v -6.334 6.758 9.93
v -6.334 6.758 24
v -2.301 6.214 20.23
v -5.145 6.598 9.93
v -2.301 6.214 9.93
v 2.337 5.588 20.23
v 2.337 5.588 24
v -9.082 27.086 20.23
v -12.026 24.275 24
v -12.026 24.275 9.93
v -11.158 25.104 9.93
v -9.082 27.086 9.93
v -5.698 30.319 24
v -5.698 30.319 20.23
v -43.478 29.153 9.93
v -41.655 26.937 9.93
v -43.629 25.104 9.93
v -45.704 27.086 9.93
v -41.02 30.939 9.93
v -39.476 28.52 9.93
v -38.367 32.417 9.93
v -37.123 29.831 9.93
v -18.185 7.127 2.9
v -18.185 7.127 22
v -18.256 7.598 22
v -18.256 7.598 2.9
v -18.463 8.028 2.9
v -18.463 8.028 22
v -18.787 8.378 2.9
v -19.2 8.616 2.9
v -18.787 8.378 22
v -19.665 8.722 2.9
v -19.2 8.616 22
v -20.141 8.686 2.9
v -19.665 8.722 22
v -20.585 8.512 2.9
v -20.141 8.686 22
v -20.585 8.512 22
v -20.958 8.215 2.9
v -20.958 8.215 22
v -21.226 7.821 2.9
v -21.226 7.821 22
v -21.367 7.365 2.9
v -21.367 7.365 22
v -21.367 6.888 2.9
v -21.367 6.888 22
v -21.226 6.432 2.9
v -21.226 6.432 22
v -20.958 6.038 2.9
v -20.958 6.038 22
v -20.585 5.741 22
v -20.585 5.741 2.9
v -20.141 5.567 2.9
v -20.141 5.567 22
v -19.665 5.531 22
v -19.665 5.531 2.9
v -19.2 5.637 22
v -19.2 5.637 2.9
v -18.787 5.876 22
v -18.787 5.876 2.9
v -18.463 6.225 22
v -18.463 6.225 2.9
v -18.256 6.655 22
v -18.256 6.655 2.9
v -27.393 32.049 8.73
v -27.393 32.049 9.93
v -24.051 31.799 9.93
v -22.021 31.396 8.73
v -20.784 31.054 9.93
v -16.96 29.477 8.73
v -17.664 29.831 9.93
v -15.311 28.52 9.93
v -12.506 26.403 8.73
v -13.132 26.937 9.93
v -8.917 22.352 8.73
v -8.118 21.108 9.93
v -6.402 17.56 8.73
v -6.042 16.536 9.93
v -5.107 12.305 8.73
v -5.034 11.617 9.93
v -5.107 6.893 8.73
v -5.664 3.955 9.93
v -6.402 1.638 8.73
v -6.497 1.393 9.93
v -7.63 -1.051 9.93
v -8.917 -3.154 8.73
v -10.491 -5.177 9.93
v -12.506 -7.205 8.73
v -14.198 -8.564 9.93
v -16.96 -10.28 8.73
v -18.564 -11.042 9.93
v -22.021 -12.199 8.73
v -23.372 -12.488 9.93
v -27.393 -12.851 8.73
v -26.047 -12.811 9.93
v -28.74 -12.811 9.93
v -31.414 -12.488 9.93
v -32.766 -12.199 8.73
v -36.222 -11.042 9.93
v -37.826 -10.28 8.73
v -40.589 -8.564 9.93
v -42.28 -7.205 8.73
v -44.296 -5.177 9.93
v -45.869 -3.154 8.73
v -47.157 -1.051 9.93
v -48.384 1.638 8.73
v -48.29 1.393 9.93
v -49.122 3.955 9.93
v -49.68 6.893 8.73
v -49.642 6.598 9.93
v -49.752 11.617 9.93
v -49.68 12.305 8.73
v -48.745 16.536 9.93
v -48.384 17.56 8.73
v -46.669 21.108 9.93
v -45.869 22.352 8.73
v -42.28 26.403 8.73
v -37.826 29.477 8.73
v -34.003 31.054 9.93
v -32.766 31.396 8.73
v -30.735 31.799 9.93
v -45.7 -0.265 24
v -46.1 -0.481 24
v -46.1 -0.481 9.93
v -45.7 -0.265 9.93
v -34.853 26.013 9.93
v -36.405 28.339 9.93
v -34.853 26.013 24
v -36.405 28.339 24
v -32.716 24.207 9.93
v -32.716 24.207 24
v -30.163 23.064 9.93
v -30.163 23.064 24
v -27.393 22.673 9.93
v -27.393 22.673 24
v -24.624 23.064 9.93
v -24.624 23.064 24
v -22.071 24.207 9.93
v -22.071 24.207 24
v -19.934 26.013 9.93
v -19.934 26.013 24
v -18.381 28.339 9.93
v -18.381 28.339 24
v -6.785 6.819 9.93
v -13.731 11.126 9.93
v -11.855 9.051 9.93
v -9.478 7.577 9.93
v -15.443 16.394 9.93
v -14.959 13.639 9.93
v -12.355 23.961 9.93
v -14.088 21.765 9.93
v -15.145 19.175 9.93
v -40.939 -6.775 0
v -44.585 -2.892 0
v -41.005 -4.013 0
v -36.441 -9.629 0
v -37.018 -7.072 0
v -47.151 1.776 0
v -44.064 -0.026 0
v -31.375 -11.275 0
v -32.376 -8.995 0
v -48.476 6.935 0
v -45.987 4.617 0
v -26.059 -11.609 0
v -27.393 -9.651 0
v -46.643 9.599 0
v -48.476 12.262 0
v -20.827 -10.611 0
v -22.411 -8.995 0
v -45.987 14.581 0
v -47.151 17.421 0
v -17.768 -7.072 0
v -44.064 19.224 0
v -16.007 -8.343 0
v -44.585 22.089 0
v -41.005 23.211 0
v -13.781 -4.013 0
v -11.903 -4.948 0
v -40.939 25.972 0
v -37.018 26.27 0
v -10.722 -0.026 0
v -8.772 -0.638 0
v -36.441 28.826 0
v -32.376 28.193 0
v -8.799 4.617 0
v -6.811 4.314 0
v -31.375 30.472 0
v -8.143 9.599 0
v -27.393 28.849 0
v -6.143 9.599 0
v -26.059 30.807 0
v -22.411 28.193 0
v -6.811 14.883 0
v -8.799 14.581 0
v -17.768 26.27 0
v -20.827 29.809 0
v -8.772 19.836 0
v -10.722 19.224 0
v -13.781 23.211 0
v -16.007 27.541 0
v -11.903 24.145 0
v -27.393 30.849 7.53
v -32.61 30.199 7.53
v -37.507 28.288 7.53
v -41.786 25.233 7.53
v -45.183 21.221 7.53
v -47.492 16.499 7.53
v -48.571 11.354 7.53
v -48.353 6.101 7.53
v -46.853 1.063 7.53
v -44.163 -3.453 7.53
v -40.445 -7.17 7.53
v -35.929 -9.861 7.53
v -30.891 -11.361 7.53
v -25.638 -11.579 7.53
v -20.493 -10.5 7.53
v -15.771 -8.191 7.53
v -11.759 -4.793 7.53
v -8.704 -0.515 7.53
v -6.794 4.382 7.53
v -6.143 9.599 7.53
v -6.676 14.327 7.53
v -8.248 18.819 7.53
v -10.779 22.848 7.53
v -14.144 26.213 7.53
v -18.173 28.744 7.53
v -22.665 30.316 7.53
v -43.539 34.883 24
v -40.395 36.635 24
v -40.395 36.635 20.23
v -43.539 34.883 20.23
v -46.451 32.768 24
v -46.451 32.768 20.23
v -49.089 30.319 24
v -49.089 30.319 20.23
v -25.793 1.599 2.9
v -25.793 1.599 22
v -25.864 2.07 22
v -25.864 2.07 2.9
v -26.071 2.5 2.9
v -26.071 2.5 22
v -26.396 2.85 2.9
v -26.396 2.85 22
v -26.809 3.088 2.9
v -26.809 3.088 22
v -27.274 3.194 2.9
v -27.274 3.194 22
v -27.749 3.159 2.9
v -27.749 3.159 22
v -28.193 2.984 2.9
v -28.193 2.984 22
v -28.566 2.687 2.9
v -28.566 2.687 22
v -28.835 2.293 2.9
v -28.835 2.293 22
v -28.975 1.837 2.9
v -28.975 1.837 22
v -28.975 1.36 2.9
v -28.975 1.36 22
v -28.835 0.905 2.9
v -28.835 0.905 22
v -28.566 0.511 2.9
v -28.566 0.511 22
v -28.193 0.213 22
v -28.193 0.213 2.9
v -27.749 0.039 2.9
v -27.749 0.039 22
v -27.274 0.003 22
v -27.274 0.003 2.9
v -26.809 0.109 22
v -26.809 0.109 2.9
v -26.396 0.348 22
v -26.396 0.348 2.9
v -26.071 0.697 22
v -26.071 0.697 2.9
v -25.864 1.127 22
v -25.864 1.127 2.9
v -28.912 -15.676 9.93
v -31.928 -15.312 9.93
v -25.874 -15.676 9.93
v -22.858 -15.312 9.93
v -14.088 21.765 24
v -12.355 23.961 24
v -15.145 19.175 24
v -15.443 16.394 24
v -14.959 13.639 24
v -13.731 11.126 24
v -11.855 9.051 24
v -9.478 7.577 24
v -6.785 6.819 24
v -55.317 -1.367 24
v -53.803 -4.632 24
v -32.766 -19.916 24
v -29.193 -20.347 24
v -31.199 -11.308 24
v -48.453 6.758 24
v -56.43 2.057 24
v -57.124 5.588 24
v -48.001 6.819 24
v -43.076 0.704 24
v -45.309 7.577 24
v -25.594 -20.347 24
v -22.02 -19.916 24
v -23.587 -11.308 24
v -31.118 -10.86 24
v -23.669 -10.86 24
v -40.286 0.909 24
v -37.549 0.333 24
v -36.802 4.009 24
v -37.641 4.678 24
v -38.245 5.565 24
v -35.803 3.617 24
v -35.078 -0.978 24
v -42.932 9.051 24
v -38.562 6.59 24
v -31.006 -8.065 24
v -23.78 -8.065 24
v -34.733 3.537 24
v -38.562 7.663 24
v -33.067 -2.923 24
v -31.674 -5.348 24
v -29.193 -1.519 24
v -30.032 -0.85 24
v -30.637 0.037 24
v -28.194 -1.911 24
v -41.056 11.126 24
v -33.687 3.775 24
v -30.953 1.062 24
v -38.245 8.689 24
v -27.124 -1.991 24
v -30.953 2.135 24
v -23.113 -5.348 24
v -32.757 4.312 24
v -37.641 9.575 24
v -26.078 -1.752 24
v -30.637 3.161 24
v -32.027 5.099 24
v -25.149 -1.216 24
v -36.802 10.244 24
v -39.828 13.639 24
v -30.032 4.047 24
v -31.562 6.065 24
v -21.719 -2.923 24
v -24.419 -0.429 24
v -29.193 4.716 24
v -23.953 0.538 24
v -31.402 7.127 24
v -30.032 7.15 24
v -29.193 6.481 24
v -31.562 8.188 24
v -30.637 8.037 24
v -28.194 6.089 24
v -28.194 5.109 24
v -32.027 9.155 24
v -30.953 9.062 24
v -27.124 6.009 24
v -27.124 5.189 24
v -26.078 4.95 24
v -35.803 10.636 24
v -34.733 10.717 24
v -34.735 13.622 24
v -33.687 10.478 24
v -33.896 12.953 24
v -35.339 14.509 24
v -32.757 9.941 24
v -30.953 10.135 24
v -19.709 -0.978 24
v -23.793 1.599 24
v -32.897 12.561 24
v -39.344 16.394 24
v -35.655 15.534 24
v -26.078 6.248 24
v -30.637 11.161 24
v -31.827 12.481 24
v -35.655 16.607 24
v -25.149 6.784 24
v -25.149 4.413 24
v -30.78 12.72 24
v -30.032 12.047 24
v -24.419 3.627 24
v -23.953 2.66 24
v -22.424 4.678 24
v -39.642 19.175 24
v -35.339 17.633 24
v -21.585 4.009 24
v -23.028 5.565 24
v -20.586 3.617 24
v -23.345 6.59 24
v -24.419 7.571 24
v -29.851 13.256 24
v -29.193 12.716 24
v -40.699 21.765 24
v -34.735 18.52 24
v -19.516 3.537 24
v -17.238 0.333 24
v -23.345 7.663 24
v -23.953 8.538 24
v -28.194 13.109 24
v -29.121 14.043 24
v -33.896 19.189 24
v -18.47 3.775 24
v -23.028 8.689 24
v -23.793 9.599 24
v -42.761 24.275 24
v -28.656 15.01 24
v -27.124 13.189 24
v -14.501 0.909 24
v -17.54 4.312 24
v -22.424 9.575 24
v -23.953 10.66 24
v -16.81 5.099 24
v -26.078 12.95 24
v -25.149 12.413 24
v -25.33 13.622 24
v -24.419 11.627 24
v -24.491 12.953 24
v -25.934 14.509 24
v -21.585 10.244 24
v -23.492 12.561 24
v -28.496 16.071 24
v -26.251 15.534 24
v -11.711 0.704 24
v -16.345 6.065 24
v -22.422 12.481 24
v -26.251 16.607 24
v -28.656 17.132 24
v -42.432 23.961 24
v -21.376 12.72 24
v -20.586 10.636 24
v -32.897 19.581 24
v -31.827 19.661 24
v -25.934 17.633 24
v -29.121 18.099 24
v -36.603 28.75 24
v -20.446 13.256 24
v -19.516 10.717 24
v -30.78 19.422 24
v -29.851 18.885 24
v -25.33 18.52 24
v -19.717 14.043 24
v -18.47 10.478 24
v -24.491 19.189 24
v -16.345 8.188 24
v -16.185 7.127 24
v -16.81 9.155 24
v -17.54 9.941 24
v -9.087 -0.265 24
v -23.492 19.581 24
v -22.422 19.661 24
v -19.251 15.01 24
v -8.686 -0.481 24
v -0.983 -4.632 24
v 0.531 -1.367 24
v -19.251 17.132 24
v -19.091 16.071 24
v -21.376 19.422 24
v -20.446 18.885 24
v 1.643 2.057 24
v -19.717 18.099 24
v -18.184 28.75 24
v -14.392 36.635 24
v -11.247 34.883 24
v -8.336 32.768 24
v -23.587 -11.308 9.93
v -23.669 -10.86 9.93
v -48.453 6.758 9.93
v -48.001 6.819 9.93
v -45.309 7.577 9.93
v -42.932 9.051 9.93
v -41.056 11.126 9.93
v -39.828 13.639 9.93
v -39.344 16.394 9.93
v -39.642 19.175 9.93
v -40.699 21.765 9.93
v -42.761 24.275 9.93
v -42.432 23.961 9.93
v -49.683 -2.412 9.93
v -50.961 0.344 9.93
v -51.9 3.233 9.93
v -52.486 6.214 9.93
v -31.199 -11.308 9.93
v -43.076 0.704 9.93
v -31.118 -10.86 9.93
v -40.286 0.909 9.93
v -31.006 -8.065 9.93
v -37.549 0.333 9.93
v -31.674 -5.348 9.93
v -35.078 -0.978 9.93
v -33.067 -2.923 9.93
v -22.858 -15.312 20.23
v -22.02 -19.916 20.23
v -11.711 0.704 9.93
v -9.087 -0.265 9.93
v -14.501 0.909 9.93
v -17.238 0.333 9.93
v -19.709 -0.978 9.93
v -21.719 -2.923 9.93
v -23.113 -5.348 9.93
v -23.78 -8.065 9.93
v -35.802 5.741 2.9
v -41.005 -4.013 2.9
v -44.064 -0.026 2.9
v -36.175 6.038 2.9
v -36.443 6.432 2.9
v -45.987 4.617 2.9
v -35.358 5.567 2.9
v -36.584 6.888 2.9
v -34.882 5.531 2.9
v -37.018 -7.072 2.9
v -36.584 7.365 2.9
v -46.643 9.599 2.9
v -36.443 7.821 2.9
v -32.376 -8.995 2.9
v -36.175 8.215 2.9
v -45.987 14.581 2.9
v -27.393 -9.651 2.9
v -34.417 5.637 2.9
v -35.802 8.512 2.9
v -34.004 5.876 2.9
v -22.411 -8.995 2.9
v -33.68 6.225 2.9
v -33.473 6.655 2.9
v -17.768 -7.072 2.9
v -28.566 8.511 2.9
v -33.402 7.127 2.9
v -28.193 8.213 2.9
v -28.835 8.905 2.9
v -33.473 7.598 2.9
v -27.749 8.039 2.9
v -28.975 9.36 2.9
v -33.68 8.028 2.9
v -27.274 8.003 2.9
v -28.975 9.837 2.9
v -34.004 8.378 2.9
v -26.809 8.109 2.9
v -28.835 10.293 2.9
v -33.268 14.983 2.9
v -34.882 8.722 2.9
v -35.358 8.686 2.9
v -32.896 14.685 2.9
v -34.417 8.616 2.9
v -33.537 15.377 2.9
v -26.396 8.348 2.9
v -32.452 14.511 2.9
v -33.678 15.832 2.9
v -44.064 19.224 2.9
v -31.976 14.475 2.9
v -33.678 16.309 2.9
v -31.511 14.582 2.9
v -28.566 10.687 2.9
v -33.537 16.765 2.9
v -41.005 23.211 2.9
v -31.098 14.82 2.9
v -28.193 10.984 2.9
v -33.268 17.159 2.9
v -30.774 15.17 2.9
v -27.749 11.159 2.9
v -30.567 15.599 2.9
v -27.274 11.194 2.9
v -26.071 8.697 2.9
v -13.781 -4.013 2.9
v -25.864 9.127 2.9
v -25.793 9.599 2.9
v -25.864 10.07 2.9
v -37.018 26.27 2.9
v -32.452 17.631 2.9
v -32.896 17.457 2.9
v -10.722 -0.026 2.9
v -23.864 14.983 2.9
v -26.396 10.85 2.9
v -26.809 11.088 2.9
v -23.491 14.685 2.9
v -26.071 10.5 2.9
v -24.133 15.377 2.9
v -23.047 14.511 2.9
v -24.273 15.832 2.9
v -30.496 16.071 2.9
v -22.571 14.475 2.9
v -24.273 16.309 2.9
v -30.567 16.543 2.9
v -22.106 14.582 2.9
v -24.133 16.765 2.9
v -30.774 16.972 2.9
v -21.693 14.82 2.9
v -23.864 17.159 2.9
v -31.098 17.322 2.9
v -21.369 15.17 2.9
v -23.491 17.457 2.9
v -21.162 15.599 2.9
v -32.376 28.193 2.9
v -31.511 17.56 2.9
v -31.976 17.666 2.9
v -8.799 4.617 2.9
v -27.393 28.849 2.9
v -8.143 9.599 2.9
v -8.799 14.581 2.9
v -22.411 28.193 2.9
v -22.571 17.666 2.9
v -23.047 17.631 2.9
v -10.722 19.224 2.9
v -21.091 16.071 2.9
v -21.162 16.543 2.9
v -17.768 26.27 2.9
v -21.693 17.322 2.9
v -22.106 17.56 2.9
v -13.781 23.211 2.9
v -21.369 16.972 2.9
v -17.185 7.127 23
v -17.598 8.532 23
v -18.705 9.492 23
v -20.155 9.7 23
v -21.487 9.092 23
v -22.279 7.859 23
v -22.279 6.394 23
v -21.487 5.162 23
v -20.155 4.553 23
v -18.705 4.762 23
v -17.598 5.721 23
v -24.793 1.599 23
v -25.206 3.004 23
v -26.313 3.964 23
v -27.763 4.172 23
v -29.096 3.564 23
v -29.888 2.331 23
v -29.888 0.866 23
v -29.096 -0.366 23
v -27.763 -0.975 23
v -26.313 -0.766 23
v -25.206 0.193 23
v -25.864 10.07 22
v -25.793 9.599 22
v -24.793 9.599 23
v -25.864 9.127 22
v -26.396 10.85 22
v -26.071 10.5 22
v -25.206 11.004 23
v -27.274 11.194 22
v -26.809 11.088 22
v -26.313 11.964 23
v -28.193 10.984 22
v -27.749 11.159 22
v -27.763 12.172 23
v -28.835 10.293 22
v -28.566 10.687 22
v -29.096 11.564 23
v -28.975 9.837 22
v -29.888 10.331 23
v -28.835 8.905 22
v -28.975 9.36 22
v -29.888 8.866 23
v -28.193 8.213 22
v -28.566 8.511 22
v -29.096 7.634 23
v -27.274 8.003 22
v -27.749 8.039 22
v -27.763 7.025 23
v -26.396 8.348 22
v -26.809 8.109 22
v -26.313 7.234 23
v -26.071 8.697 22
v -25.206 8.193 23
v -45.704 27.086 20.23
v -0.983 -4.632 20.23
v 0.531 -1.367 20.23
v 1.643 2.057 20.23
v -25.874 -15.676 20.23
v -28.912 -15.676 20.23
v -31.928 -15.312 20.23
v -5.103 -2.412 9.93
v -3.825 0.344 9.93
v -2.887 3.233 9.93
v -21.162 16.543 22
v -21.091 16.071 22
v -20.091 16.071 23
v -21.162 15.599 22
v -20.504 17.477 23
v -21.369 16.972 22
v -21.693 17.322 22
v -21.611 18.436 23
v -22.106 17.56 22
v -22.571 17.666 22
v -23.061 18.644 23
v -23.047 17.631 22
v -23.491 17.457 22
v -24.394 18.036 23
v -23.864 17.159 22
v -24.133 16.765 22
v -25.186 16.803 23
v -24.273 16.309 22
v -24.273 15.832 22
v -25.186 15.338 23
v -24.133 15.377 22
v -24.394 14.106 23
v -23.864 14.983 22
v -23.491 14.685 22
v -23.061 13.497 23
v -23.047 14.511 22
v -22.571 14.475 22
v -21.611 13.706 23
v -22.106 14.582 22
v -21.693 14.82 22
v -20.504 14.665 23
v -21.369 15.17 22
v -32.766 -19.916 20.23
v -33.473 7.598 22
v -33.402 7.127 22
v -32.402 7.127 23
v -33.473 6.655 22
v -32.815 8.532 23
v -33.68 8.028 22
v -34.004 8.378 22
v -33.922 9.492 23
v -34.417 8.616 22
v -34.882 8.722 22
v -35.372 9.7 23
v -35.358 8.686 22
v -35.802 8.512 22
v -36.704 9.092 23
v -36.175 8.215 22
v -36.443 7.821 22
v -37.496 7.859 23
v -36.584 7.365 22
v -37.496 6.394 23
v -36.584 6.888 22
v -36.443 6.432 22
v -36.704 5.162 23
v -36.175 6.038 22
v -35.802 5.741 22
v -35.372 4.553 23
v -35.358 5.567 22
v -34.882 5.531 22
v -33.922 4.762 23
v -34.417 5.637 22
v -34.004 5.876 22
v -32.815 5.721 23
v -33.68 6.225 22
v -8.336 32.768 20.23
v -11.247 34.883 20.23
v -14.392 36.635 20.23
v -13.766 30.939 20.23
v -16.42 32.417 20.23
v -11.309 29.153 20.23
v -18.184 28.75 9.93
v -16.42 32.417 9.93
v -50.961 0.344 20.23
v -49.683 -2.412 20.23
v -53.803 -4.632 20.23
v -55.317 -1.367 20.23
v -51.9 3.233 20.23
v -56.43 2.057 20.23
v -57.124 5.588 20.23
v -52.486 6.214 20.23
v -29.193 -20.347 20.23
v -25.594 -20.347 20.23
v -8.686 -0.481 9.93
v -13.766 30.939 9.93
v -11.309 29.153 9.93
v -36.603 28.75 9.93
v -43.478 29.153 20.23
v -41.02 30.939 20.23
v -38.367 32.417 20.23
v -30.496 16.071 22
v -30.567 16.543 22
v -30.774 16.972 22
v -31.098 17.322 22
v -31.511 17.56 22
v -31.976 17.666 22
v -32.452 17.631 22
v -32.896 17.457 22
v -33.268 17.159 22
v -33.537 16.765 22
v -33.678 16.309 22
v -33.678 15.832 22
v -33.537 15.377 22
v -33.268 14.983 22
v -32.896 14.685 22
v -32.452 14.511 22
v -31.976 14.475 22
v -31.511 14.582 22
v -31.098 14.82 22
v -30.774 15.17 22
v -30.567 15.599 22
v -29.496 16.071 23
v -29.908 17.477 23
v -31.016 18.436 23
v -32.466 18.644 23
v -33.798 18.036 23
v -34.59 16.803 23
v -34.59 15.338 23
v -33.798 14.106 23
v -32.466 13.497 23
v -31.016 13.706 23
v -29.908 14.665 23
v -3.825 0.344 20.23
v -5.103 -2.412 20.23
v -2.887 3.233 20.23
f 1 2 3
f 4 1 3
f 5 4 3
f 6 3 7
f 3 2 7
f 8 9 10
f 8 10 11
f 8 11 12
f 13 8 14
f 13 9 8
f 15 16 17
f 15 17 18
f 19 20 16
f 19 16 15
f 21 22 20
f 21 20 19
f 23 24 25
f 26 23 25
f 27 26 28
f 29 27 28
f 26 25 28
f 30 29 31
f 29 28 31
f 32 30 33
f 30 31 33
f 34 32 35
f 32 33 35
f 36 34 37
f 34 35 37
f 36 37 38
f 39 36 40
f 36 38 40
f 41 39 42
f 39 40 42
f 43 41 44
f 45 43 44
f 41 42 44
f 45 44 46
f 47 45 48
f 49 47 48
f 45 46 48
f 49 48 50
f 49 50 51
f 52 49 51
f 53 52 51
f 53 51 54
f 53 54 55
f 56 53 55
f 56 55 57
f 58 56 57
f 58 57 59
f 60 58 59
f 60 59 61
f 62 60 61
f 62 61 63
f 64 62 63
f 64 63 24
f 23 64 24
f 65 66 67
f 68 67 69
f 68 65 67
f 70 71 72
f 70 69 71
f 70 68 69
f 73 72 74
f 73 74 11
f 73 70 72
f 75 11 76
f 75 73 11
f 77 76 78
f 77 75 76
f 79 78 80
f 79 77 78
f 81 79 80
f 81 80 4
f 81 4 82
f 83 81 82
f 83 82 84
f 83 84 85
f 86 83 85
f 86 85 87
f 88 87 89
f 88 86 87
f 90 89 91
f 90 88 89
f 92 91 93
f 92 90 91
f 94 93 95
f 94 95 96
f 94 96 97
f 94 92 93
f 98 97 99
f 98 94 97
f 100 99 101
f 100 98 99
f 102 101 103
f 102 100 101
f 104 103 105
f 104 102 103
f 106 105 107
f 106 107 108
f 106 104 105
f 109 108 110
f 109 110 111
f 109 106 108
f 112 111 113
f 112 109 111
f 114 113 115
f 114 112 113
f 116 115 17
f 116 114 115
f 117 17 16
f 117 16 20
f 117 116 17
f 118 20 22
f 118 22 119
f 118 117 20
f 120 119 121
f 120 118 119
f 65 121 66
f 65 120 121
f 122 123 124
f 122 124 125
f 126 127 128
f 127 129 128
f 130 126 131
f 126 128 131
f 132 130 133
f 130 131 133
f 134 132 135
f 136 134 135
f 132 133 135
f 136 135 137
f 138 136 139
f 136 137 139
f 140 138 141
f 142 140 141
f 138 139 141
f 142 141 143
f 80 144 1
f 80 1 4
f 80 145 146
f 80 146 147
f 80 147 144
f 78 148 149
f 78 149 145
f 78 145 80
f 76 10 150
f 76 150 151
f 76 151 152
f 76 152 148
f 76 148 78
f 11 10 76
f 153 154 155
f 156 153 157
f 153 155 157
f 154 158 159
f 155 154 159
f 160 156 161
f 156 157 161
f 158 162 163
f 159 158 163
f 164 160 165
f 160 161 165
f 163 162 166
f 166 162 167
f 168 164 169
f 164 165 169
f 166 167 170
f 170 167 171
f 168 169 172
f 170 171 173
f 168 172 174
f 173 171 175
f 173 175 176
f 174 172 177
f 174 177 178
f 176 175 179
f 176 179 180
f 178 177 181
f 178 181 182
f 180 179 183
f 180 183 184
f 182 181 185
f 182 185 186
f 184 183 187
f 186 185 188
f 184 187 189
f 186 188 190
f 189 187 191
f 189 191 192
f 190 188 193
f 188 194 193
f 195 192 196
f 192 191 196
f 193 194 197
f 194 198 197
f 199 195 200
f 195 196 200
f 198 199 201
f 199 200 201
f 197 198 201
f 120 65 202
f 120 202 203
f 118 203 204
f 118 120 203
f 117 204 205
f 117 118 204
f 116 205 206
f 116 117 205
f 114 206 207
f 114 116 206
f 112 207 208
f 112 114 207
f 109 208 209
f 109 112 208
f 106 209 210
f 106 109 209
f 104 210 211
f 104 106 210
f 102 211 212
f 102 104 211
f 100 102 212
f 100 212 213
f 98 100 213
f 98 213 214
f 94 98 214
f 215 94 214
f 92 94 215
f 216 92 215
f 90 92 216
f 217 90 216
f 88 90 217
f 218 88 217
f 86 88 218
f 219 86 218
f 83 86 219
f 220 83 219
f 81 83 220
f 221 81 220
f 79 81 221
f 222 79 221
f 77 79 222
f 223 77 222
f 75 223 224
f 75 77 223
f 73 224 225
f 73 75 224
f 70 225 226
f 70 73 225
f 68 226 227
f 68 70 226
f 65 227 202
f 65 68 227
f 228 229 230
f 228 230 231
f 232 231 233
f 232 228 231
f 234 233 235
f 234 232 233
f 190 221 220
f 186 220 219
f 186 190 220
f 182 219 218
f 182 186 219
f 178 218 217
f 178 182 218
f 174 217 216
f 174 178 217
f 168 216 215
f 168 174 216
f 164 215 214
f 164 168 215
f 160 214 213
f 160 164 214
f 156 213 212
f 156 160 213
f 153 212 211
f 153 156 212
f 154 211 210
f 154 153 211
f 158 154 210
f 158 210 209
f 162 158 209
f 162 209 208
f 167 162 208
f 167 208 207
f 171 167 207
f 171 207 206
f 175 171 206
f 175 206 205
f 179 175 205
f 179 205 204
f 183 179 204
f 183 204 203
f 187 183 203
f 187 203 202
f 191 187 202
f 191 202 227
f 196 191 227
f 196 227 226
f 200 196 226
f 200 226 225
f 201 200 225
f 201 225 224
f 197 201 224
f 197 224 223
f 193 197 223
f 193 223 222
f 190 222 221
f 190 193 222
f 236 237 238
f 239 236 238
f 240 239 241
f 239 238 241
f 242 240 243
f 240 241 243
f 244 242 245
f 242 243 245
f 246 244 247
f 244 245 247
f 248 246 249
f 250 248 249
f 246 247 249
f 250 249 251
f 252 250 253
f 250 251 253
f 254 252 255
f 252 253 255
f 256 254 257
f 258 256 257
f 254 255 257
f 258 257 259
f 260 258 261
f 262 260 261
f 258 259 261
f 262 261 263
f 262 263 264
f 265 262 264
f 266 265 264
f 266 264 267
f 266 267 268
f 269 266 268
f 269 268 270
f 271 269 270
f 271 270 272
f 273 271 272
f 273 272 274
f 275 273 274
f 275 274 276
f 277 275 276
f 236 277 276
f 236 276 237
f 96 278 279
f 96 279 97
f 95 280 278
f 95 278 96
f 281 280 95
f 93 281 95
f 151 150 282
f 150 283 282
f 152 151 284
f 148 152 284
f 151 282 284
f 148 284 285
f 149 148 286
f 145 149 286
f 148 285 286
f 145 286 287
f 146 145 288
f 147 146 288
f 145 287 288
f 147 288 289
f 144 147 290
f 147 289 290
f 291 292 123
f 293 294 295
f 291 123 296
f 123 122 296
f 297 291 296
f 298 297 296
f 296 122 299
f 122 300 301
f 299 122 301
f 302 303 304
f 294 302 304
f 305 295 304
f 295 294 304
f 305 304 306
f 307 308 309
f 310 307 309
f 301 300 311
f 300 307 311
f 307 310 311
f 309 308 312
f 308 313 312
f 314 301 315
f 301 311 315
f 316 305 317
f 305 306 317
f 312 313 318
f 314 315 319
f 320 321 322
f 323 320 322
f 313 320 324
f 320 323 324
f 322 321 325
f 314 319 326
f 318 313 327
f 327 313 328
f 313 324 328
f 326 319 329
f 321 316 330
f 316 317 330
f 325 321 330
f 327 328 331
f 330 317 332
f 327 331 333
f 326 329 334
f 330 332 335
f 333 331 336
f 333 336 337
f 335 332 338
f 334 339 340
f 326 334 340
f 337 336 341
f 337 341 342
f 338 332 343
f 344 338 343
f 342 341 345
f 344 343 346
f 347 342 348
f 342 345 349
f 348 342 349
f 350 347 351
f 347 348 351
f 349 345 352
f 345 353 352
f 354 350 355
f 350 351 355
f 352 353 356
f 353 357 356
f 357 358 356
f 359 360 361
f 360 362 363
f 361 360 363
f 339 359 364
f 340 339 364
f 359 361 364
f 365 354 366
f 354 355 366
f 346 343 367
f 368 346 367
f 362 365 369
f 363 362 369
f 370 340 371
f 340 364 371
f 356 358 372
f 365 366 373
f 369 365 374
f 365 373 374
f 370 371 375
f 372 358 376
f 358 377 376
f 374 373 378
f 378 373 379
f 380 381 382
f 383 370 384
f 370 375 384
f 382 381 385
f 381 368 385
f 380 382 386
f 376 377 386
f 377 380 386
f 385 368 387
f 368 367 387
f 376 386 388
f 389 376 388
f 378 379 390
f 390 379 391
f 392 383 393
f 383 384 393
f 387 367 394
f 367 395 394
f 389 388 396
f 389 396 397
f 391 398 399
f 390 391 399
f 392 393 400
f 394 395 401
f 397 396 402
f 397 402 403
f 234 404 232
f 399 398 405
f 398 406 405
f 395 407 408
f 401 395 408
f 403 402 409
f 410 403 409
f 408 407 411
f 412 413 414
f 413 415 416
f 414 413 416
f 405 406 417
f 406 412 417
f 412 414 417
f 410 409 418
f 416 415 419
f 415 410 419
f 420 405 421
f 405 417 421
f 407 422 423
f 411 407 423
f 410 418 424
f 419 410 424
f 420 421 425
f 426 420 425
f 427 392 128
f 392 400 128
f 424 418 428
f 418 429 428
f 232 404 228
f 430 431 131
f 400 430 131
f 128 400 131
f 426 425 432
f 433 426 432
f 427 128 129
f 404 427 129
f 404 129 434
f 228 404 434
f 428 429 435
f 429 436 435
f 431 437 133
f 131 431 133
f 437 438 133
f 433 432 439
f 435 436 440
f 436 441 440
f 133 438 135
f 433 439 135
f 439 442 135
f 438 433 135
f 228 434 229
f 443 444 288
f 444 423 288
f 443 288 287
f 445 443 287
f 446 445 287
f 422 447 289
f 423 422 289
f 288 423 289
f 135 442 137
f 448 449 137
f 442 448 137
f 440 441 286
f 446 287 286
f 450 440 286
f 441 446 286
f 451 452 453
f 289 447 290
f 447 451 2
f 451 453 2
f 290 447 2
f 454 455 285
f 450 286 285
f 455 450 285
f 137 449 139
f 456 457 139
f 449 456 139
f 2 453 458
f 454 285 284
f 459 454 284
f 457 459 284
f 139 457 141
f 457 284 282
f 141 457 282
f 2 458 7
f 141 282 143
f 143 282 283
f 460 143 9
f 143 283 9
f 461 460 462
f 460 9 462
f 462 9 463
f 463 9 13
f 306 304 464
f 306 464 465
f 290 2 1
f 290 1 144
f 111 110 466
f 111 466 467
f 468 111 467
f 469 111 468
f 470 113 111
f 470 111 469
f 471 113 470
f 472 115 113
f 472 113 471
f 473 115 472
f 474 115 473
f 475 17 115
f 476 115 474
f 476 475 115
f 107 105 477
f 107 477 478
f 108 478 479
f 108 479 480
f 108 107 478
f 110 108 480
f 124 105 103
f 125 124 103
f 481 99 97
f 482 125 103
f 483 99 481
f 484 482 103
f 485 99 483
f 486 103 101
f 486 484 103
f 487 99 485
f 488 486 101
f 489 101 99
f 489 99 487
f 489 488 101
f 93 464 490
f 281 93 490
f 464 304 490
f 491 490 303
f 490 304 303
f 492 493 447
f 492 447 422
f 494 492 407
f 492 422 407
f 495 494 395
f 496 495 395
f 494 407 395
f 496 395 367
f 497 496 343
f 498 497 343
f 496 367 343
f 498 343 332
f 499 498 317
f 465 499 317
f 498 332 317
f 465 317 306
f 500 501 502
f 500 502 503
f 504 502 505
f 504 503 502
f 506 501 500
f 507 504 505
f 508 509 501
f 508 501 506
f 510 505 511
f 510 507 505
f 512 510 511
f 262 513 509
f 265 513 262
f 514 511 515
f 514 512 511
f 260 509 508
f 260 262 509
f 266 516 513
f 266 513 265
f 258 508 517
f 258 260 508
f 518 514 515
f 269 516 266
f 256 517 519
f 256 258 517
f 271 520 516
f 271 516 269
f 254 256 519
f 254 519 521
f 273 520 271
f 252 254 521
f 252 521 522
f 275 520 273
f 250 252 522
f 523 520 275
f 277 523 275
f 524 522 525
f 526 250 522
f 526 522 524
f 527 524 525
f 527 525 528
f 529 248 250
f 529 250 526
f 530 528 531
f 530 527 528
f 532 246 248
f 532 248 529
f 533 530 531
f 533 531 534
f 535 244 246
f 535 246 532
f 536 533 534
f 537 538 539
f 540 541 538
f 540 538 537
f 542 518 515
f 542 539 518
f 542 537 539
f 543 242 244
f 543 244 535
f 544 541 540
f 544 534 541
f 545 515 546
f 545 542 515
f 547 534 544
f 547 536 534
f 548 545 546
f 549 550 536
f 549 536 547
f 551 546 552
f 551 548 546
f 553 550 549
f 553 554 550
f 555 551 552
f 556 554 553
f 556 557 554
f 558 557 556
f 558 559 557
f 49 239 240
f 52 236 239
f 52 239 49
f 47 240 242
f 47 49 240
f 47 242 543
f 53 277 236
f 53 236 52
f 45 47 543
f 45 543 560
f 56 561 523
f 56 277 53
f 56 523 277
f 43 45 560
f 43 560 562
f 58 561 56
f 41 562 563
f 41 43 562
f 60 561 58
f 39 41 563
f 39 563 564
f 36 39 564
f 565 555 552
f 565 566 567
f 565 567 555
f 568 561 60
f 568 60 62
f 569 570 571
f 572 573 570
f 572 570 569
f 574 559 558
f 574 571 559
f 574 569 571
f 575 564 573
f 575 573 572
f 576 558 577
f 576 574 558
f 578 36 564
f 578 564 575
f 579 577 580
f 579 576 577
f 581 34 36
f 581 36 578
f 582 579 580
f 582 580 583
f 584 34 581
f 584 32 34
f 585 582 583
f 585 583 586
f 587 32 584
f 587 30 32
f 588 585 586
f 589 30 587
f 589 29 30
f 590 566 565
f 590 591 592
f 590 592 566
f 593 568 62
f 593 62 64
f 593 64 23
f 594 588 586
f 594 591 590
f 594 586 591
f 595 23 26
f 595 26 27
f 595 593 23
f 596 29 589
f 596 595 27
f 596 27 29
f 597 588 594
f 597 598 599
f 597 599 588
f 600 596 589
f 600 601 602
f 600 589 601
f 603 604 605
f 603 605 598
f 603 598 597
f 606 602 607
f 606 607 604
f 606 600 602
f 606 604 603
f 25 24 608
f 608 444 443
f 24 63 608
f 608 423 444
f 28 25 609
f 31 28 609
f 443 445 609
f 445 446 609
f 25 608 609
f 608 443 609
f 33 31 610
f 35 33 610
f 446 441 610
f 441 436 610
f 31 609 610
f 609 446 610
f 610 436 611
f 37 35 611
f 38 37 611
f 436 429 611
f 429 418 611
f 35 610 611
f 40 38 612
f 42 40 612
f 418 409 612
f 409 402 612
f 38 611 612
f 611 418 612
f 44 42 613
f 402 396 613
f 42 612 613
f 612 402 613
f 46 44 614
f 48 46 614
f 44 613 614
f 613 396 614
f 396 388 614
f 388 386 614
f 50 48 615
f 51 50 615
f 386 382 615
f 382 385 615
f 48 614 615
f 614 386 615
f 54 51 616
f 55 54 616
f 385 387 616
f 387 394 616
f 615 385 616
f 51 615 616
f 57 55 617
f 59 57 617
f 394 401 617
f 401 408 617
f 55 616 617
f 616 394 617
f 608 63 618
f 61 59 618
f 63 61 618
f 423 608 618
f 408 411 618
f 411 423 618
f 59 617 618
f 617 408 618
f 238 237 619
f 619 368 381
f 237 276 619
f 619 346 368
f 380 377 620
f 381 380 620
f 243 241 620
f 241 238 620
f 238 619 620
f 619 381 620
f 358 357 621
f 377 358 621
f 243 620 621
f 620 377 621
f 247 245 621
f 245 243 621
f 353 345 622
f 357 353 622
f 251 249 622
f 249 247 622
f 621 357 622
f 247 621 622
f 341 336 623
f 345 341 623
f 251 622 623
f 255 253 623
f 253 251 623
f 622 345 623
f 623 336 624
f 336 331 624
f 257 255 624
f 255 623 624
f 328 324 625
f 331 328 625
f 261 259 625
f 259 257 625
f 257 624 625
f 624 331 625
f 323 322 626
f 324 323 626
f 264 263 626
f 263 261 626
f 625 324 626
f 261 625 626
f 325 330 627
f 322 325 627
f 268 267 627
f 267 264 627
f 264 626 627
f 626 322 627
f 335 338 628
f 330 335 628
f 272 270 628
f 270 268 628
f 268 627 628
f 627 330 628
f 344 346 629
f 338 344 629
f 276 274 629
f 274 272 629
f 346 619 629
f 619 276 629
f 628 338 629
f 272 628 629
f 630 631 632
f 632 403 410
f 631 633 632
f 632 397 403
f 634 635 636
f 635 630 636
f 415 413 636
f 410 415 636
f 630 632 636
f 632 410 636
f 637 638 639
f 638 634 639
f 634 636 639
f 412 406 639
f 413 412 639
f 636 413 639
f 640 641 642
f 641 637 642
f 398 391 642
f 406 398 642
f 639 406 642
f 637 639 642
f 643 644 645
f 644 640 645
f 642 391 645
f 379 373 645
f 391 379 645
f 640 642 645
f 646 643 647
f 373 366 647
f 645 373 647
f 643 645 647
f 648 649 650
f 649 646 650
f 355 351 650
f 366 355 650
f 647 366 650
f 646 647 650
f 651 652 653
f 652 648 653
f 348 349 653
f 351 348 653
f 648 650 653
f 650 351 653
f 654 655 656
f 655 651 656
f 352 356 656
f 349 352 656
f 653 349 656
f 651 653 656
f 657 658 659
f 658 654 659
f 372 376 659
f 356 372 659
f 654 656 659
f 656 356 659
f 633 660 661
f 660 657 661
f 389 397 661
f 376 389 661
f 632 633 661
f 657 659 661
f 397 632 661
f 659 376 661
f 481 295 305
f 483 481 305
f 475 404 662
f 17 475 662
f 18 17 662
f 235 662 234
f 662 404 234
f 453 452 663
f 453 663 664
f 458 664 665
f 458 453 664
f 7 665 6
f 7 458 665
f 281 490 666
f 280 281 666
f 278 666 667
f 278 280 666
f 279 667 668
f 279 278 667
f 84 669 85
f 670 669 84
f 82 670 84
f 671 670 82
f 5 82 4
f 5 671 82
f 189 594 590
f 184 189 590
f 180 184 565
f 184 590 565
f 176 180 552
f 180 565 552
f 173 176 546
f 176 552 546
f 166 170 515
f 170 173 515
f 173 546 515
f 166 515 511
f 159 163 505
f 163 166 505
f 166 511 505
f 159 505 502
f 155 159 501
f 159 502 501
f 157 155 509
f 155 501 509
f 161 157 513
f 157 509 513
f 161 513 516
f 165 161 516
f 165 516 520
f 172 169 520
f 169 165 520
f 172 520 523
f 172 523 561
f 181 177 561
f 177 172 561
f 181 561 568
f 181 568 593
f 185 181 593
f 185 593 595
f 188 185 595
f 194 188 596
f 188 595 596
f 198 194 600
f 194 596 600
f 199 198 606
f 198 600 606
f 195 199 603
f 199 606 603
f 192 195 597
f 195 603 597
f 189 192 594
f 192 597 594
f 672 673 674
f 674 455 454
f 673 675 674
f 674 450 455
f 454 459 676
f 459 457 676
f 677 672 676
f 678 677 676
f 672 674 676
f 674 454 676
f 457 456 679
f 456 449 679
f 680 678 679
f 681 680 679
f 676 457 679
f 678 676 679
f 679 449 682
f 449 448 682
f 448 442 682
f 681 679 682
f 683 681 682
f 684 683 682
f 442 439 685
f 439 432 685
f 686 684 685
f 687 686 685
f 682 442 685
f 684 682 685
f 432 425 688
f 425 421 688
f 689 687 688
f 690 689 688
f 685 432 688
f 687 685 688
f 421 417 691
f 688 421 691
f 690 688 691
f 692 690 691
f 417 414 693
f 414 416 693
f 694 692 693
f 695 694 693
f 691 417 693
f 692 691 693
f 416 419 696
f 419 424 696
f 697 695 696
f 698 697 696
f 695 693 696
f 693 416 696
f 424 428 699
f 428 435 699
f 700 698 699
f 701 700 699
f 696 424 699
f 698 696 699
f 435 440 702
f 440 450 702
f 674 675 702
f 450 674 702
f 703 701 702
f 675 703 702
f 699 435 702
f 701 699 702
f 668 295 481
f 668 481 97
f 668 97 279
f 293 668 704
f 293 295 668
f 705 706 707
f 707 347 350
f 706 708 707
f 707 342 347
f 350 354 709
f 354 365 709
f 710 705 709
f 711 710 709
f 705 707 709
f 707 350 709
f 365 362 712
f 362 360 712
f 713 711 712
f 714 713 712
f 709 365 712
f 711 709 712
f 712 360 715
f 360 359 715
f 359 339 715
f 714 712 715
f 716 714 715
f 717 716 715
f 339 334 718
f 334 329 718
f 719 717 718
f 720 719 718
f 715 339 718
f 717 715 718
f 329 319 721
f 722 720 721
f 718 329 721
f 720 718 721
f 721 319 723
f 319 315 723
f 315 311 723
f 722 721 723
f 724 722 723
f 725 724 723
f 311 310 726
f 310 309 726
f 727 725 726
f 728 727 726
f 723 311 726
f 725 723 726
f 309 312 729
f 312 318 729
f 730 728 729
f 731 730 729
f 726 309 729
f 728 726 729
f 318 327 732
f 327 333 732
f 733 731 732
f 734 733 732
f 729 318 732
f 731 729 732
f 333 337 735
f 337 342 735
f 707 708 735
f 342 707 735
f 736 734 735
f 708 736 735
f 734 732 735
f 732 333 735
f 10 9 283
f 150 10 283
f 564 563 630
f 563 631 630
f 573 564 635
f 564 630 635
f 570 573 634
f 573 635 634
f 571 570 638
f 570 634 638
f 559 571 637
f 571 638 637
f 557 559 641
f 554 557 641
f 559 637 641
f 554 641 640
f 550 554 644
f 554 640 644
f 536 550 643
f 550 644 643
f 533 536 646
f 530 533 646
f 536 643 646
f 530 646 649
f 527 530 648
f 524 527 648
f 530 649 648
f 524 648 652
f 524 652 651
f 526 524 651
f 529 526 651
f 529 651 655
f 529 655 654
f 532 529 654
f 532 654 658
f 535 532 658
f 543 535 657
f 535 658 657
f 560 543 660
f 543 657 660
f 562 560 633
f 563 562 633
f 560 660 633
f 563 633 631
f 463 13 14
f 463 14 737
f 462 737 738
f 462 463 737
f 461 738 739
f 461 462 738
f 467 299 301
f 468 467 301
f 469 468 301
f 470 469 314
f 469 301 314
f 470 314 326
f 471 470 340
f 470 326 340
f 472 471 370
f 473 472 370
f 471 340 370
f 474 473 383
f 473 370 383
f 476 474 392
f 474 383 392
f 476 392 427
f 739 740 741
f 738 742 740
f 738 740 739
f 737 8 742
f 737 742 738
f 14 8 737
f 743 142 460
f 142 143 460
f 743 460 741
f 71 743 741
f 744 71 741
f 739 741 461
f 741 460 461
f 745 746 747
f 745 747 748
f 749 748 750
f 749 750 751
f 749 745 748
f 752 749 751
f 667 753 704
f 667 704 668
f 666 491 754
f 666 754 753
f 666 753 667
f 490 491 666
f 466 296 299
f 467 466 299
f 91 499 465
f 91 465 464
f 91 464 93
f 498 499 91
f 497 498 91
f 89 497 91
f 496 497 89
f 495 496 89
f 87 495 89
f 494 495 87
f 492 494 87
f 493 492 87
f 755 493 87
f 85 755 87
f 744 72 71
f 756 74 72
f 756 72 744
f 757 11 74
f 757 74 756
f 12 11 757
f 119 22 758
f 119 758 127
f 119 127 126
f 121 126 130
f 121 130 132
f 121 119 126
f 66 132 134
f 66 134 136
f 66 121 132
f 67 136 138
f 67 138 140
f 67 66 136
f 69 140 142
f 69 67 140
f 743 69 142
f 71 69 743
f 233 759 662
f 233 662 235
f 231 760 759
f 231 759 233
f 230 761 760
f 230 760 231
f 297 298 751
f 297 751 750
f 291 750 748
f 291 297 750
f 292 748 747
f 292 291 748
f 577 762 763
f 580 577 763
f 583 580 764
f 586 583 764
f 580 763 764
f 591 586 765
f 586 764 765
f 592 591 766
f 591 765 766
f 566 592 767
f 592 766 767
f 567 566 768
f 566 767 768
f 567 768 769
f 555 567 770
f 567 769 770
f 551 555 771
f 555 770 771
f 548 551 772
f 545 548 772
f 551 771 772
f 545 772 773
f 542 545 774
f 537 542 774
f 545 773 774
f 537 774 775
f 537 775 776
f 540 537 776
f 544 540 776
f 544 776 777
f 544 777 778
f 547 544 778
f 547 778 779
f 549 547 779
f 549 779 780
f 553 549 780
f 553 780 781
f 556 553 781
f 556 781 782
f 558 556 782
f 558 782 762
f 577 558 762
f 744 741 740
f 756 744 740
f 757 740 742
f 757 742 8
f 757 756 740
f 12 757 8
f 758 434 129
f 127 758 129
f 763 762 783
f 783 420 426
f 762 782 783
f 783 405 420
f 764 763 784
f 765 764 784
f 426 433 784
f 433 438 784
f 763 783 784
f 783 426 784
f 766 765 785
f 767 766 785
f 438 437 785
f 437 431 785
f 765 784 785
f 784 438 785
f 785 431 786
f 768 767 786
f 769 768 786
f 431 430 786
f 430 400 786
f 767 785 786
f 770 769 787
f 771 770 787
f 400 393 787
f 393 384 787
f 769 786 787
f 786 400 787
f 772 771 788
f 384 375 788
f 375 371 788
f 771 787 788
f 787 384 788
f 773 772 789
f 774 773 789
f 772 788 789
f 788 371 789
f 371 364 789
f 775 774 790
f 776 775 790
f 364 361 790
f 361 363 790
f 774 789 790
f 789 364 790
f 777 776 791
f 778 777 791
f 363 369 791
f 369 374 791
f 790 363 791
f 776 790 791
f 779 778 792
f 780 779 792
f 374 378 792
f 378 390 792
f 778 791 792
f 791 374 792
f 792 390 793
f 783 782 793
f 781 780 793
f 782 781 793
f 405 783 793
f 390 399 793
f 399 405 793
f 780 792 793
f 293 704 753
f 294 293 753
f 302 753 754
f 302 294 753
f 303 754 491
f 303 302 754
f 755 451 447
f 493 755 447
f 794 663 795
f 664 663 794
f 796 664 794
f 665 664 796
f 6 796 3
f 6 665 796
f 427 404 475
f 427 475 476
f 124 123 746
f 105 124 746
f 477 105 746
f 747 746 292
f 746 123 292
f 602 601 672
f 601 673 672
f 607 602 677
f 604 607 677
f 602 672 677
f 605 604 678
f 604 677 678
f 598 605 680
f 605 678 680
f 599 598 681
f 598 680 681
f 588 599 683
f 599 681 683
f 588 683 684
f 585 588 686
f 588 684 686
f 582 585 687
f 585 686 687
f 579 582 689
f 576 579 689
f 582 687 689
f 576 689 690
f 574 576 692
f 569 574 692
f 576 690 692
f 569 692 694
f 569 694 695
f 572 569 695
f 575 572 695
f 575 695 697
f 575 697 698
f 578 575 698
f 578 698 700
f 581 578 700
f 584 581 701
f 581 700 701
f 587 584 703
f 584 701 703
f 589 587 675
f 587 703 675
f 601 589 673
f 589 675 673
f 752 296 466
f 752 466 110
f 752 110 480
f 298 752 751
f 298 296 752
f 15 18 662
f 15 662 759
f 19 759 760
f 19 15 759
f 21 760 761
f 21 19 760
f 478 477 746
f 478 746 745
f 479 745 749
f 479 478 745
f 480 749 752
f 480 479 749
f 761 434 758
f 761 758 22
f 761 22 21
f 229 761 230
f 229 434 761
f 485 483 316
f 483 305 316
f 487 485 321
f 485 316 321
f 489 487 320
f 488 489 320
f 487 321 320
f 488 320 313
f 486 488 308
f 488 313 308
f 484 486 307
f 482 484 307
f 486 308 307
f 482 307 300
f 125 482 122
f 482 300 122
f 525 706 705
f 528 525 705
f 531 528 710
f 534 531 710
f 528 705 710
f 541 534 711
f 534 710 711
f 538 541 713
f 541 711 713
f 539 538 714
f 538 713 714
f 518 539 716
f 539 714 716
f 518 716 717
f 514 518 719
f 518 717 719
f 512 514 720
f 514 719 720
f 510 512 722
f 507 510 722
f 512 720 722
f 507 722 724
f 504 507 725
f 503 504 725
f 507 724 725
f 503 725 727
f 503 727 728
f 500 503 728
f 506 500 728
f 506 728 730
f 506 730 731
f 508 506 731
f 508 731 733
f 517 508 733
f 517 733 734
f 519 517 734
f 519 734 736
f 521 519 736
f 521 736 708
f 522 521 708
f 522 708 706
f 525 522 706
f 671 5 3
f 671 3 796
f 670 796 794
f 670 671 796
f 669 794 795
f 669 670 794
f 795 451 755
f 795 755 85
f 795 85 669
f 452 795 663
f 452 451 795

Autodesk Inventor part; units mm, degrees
ref_plane "YZ Plane" through (0, 0, 0) normal (1, 0, 0) x (0, 1, 0)
ref_plane "XZ Plane" through (0, 0, 0) normal (0, 1, 0) x (-1, 0, 0)
sketch "Эскиз1" plane through (0, 0, 0) normal (0, 0, 1) x (1, 0, 0)
  circle A0 centre (-27.3933, 9.5988) radius 21.25 projected
  circle A1 centre (-27.3933, 9.5988) radius 18.75 projected
  point P0 (0, 0)
ref_plane "РабПлоскость1" through (-34.9651, 34.6315, 13) normal (0, 0, 1) x (1, 0, 0)
extrude "Выдавливание1" add sketch "Эскиз1" along normal up to surface (13 mm away) contours A0 | A1
ref_plane "РабПлоскость3" through (-27.3933, 9.5988, 13) normal (-1, 0, 0) x (0, -1, 0)
sketch "Эскиз3" plane through (-27.3933, 9.5988, 13) normal (-1, 0, 0) x (0, -1, 0)
  line L0 (-22.45, -4.27) -> (-21.25, -5.47)
  line L1 (-22.45, -3.07) -> (-22.45, -4.27)
  line L2 (30, -3.07) -> (-30, -3.07) projected
  line L3 (30, -3.07) -> (-30, -3.07) projected
  line L4 (-21.25, 0) -> (21.25, 0) projected
  line L5 (-21.25, 0) -> (-30, 0)
  line L6 (-30, 0) -> (-30, -3.07)
  line L7 (-30, -3.07) -> (-21.25, -3.07)
  line L8 (-21.25, -3.07) -> (-21.25, 0)
  line L9 (0, 0) -> (0, -13)
  line L10 (21.25, -13) -> (-21.25, -13) projected
  line L11 (-21.25, -13) -> (-21.25, 0) projected
  line L12 (0, 0) -> (-30, 0)
  line L13 (-30, 0) -> (-30, 11)
  line L14 (-30, 11) -> (0, 11)
  line L15 (0, 11) -> (0, 0)
  line L16 (-25.52, 6.93) -> (-25.52, -23)
  line L17 (-25.32, 6.93) -> (-25.32, -23)
  line L18 (-25.32, 6.93) -> (-25.32, 11)
  line L19 (-25.32, 6.93) -> (-30, 6.93)
  line L20 (-25.32, 7.23) -> (-30, 7.23)
  point P0 (9.5988, -13)
  point P1 (-21.25, -3.07)
  point P2 (-25.32, -3.07)
  dimension "d21" = 11
  dimension "d25" = 0.2
  dimension "d26" = 0.3
revolve "Вращение1" add sketch "Эскиз3" angle 360 about axis through (-27.3933, 9.5988, 13) along (0, 0, -1) contours L1 L2 L11 L0 | L2 L17 L5 L8 | L5 L17 L18 L14 L15 L4 | L20 L13 L14 L18
sketch "Эскиз5" plane through (-27.3933, 9.5988, 24) normal (0, 0, 1) x (1, 0, 0)
  circle A0 centre (0, 0) radius 22.45 projected
  line L0 (-30.0943, 4.3007) -> (-34.526, 5.7406) projected
  arc A1 (-34.526, 5.7406) -> (-24.5579, -24.9382) centre (0, 0) ccw projected
  line L1 (-24.5579, -24.9382) -> (-21.8189, -21.1683) projected
  arc A2 (-21.8189, -21.1683) -> (-13.3898, -27.2924) centre (0, 0) ccw projected
  line L2 (-13.3898, -27.2924) -> (-16.1288, -31.0622) projected
  arc A3 (-16.1288, -31.0622) -> (16.1288, -31.0622) centre (0, 0) ccw projected
  line L3 (16.1288, -31.0622) -> (13.3898, -27.2924) projected
  arc A4 (13.3898, -27.2924) -> (21.8189, -21.1683) centre (0, 0) ccw projected
  line L4 (21.8189, -21.1683) -> (24.5579, -24.9382) projected
  arc A5 (24.5579, -24.9382) -> (34.526, 5.7406) centre (0, 0) ccw projected
  line L5 (34.526, 5.7406) -> (30.0943, 4.3007) projected
  arc A6 (30.0943, 4.3007) -> (26.8746, 14.2096) centre (0, 0) ccw projected
  line L6 (26.8746, 14.2096) -> (31.3064, 15.6496) projected
  arc A7 (31.3064, 15.6496) -> (5.2094, 34.6101) centre (0, 0) ccw projected
  line L7 (5.2094, 34.6101) -> (5.2094, 29.9503) projected
  arc A8 (5.2094, 29.9503) -> (-5.2094, 29.9503) centre (0, 0) ccw projected
  line L8 (-5.2094, 29.9503) -> (-5.2094, 34.6101) projected
  arc A9 (-5.2094, 34.6101) -> (-31.3064, 15.6496) centre (0, 0) ccw projected
  line L9 (-31.3064, 15.6496) -> (-26.8746, 14.2096) projected
  arc A10 (-26.8746, 14.2096) -> (-30.0943, 4.3007) centre (0, 0) ccw projected
  line L10 (3.8059, -20.9064) -> (6.2685, -34.4341) projected
  line L11 (18.7071, -10.0801) -> (30.8117, -16.6024) projected
  line L12 (21.0593, -2.8408) -> (34.6858, -4.679) projected
  line L13 (15.3675, 14.6766) -> (25.3112, 24.1732) projected
  line L14 (9.2094, 19.1507) -> (15.1685, 31.5423) projected
  line L15 (-9.2094, 19.1507) -> (-15.1685, 31.5423) projected
  line L16 (-15.3675, 14.6766) -> (-25.3112, 24.1732) projected
  line L17 (-21.0593, -2.8408) -> (-34.6858, -4.679) projected
  line L18 (-18.7071, -10.0801) -> (-30.8117, -16.6024) projected
  line L19 (-3.8059, -20.9064) -> (-6.2685, -34.4341) projected
  circle A11 centre (0, 0) radius 21.25 projected
  line L20 (-9.2094, 19.1507) -> (-9.0121, 18.7403)
  line L21 (9.0121, 18.7403) -> (9.2094, 19.1507)
  line L22 (15.3675, 14.6766) -> (15.0382, 14.3621)
  line L23 (21.0593, -2.8408) -> (20.608, -2.7799)
  line L24 (18.7071, -10.0801) -> (18.3062, -9.864)
  line L25 (3.8059, -20.9064) -> (3.7243, -20.4584)
  line L26 (-3.8059, -20.9064) -> (-3.7243, -20.4584)
  line L27 (-18.7071, -10.0801) -> (-18.3062, -9.864)
  line L28 (-21.0593, -2.8408) -> (-20.608, -2.7799)
  line L29 (-15.3675, 14.6766) -> (-15.0382, 14.3621)
  arc A12 (-20.608, -2.7799) -> (-15.0382, 14.3621) centre (-21.9448, 7.1303) ccw
  arc A13 (-9.0121, 18.7403) -> (9.0121, 18.7403) centre (0, 23.0741) ccw
  arc A14 (15.0382, 14.3621) -> (20.608, -2.7799) centre (21.9448, 7.1303) ccw
  arc A15 (18.3062, -9.864) -> (3.7243, -20.4584) centre (13.5626, -18.6674) ccw
  arc A16 (-3.7243, -20.4584) -> (-18.3062, -9.864) centre (-13.5626, -18.6674) ccw
  point P0 (27.3933, -9.5988)
  dimension "d22" = 10
extrude "Выдавливание3" cut sketch "Эскиз5" against normal up to surface (14.07 mm away) contours A0 L12 A11 L13 | A0 L13 A7 L6 A6 L5 A5 L12 | L14 A11 L15 A0 | A0 L15 A9 L8 A8 L7 A7 L14 | A11 L23 A14 L22 | L11 A5 L4 A4 L3 A3 L10 A0 | A0 L10 A11 L11 | L21 A13 L20 A11 | A11 L25 A15 L24 | L16 A11 L17 A0 | A0 L17 A1 L0 A10 L9 A9 L16 | L19 A3 L2 A2 L1 A1 L18 A0 | A0 L18 A11 L19 | L29 A12 L28 A11 | A11 L27 A16 L26
sketch "Эскиз6" plane through (-27.3933, 9.5988, 13) normal (-1, 0, 0) x (0, -1, 0)
  line L0 (16.6287, -10.8787) -> (-16.6287, -10.8787) projected
  line L1 (-21.25, -13) -> (21.25, -13) projected
  line L2 (-18.75, -13) -> (-16.6287, -10.8787)
  line L3 (18.75, -13) -> (16.6287, -10.8787)
  line L4 (21.25, -13) -> (-21.25, -13) projected
  line L5 (-21.25, -13) -> (-19.25, -13)
  line L6 (-19.25, -13) -> (-17.1287, -10.8787)
  line L7 (0, -10.8787) -> (0, -10.3787)
  line L8 (0, -10.3787) -> (-16.6287, -10.3787)
  line L9 (-16.6287, -10.3787) -> (-17.1287, -10.8787)
  line L10 (0, -10.3787) -> (0, -13)
  line L11 (0, -13) -> (-19.25, -13)
  line L12 (-19.25, -13) -> (-19.25, -10.1)
  line L13 (-19.25, -10.1) -> (0, -10.1)
  line L14 (0, -10.3787) -> (0, -10.1)
  point P0 (20.25, -13)
  point P1 (-19.25, -13)
  dimension "d29" = 2
  dimension "d30" = 135
  dimension "d31" = 0.5
  dimension "d44" = 2.9
revolve "Вращение2" cut sketch "Эскиз6" angle 360 about axis through (-27.3933, 9.5988, 2.6213) along (0, 0, -1) contours L10 L1 L2 L0 | L0 L2 L1 L6 L9 L8 L7 | L8 L9 L6 L12 L13 L14
sketch "Эскиз7" plane through (-27.3933, 32.6729, 24) normal (0, 0, 1) x (1, 0, 0)
  circle A0 centre (0, -23.0741) radius 22.45 projected
  circle A1 centre (0, -23.0741) radius 1.6
  line L0 (0, -23.0741) -> (0, -31.0741)
  circle A2 centre (0, -31.0741) radius 1.6
  circle A3 centre (7.6085, -25.5463) radius 1.6
  circle A4 centre (4.7023, -16.602) radius 1.6
  circle A5 centre (-4.7023, -16.602) radius 1.6
  circle A6 centre (-7.6085, -25.5463) radius 1.6
  point P0 (27.3933, -32.6729)
  dimension "d33" = 3.2
  dimension "d34" = 8
  dimension "d37" = 360
extrude "Выдавливание4" cut sketch "Эскиз7" against normal blind 30 contours A1 | A2 | A3 | A4 | A5 | A6
chamfer "Фаска1" distance 2 angle 45 6 edges at (-28.9933, 1.5988, 24) (-36.6017, 7.1266, 24) (-33.6955, 16.0709, 24) (-28.9933, 9.5988, 24) (-24.291, 16.0709, 24) (-21.3848, 7.1266, 24)
properties part number "tire cap"
